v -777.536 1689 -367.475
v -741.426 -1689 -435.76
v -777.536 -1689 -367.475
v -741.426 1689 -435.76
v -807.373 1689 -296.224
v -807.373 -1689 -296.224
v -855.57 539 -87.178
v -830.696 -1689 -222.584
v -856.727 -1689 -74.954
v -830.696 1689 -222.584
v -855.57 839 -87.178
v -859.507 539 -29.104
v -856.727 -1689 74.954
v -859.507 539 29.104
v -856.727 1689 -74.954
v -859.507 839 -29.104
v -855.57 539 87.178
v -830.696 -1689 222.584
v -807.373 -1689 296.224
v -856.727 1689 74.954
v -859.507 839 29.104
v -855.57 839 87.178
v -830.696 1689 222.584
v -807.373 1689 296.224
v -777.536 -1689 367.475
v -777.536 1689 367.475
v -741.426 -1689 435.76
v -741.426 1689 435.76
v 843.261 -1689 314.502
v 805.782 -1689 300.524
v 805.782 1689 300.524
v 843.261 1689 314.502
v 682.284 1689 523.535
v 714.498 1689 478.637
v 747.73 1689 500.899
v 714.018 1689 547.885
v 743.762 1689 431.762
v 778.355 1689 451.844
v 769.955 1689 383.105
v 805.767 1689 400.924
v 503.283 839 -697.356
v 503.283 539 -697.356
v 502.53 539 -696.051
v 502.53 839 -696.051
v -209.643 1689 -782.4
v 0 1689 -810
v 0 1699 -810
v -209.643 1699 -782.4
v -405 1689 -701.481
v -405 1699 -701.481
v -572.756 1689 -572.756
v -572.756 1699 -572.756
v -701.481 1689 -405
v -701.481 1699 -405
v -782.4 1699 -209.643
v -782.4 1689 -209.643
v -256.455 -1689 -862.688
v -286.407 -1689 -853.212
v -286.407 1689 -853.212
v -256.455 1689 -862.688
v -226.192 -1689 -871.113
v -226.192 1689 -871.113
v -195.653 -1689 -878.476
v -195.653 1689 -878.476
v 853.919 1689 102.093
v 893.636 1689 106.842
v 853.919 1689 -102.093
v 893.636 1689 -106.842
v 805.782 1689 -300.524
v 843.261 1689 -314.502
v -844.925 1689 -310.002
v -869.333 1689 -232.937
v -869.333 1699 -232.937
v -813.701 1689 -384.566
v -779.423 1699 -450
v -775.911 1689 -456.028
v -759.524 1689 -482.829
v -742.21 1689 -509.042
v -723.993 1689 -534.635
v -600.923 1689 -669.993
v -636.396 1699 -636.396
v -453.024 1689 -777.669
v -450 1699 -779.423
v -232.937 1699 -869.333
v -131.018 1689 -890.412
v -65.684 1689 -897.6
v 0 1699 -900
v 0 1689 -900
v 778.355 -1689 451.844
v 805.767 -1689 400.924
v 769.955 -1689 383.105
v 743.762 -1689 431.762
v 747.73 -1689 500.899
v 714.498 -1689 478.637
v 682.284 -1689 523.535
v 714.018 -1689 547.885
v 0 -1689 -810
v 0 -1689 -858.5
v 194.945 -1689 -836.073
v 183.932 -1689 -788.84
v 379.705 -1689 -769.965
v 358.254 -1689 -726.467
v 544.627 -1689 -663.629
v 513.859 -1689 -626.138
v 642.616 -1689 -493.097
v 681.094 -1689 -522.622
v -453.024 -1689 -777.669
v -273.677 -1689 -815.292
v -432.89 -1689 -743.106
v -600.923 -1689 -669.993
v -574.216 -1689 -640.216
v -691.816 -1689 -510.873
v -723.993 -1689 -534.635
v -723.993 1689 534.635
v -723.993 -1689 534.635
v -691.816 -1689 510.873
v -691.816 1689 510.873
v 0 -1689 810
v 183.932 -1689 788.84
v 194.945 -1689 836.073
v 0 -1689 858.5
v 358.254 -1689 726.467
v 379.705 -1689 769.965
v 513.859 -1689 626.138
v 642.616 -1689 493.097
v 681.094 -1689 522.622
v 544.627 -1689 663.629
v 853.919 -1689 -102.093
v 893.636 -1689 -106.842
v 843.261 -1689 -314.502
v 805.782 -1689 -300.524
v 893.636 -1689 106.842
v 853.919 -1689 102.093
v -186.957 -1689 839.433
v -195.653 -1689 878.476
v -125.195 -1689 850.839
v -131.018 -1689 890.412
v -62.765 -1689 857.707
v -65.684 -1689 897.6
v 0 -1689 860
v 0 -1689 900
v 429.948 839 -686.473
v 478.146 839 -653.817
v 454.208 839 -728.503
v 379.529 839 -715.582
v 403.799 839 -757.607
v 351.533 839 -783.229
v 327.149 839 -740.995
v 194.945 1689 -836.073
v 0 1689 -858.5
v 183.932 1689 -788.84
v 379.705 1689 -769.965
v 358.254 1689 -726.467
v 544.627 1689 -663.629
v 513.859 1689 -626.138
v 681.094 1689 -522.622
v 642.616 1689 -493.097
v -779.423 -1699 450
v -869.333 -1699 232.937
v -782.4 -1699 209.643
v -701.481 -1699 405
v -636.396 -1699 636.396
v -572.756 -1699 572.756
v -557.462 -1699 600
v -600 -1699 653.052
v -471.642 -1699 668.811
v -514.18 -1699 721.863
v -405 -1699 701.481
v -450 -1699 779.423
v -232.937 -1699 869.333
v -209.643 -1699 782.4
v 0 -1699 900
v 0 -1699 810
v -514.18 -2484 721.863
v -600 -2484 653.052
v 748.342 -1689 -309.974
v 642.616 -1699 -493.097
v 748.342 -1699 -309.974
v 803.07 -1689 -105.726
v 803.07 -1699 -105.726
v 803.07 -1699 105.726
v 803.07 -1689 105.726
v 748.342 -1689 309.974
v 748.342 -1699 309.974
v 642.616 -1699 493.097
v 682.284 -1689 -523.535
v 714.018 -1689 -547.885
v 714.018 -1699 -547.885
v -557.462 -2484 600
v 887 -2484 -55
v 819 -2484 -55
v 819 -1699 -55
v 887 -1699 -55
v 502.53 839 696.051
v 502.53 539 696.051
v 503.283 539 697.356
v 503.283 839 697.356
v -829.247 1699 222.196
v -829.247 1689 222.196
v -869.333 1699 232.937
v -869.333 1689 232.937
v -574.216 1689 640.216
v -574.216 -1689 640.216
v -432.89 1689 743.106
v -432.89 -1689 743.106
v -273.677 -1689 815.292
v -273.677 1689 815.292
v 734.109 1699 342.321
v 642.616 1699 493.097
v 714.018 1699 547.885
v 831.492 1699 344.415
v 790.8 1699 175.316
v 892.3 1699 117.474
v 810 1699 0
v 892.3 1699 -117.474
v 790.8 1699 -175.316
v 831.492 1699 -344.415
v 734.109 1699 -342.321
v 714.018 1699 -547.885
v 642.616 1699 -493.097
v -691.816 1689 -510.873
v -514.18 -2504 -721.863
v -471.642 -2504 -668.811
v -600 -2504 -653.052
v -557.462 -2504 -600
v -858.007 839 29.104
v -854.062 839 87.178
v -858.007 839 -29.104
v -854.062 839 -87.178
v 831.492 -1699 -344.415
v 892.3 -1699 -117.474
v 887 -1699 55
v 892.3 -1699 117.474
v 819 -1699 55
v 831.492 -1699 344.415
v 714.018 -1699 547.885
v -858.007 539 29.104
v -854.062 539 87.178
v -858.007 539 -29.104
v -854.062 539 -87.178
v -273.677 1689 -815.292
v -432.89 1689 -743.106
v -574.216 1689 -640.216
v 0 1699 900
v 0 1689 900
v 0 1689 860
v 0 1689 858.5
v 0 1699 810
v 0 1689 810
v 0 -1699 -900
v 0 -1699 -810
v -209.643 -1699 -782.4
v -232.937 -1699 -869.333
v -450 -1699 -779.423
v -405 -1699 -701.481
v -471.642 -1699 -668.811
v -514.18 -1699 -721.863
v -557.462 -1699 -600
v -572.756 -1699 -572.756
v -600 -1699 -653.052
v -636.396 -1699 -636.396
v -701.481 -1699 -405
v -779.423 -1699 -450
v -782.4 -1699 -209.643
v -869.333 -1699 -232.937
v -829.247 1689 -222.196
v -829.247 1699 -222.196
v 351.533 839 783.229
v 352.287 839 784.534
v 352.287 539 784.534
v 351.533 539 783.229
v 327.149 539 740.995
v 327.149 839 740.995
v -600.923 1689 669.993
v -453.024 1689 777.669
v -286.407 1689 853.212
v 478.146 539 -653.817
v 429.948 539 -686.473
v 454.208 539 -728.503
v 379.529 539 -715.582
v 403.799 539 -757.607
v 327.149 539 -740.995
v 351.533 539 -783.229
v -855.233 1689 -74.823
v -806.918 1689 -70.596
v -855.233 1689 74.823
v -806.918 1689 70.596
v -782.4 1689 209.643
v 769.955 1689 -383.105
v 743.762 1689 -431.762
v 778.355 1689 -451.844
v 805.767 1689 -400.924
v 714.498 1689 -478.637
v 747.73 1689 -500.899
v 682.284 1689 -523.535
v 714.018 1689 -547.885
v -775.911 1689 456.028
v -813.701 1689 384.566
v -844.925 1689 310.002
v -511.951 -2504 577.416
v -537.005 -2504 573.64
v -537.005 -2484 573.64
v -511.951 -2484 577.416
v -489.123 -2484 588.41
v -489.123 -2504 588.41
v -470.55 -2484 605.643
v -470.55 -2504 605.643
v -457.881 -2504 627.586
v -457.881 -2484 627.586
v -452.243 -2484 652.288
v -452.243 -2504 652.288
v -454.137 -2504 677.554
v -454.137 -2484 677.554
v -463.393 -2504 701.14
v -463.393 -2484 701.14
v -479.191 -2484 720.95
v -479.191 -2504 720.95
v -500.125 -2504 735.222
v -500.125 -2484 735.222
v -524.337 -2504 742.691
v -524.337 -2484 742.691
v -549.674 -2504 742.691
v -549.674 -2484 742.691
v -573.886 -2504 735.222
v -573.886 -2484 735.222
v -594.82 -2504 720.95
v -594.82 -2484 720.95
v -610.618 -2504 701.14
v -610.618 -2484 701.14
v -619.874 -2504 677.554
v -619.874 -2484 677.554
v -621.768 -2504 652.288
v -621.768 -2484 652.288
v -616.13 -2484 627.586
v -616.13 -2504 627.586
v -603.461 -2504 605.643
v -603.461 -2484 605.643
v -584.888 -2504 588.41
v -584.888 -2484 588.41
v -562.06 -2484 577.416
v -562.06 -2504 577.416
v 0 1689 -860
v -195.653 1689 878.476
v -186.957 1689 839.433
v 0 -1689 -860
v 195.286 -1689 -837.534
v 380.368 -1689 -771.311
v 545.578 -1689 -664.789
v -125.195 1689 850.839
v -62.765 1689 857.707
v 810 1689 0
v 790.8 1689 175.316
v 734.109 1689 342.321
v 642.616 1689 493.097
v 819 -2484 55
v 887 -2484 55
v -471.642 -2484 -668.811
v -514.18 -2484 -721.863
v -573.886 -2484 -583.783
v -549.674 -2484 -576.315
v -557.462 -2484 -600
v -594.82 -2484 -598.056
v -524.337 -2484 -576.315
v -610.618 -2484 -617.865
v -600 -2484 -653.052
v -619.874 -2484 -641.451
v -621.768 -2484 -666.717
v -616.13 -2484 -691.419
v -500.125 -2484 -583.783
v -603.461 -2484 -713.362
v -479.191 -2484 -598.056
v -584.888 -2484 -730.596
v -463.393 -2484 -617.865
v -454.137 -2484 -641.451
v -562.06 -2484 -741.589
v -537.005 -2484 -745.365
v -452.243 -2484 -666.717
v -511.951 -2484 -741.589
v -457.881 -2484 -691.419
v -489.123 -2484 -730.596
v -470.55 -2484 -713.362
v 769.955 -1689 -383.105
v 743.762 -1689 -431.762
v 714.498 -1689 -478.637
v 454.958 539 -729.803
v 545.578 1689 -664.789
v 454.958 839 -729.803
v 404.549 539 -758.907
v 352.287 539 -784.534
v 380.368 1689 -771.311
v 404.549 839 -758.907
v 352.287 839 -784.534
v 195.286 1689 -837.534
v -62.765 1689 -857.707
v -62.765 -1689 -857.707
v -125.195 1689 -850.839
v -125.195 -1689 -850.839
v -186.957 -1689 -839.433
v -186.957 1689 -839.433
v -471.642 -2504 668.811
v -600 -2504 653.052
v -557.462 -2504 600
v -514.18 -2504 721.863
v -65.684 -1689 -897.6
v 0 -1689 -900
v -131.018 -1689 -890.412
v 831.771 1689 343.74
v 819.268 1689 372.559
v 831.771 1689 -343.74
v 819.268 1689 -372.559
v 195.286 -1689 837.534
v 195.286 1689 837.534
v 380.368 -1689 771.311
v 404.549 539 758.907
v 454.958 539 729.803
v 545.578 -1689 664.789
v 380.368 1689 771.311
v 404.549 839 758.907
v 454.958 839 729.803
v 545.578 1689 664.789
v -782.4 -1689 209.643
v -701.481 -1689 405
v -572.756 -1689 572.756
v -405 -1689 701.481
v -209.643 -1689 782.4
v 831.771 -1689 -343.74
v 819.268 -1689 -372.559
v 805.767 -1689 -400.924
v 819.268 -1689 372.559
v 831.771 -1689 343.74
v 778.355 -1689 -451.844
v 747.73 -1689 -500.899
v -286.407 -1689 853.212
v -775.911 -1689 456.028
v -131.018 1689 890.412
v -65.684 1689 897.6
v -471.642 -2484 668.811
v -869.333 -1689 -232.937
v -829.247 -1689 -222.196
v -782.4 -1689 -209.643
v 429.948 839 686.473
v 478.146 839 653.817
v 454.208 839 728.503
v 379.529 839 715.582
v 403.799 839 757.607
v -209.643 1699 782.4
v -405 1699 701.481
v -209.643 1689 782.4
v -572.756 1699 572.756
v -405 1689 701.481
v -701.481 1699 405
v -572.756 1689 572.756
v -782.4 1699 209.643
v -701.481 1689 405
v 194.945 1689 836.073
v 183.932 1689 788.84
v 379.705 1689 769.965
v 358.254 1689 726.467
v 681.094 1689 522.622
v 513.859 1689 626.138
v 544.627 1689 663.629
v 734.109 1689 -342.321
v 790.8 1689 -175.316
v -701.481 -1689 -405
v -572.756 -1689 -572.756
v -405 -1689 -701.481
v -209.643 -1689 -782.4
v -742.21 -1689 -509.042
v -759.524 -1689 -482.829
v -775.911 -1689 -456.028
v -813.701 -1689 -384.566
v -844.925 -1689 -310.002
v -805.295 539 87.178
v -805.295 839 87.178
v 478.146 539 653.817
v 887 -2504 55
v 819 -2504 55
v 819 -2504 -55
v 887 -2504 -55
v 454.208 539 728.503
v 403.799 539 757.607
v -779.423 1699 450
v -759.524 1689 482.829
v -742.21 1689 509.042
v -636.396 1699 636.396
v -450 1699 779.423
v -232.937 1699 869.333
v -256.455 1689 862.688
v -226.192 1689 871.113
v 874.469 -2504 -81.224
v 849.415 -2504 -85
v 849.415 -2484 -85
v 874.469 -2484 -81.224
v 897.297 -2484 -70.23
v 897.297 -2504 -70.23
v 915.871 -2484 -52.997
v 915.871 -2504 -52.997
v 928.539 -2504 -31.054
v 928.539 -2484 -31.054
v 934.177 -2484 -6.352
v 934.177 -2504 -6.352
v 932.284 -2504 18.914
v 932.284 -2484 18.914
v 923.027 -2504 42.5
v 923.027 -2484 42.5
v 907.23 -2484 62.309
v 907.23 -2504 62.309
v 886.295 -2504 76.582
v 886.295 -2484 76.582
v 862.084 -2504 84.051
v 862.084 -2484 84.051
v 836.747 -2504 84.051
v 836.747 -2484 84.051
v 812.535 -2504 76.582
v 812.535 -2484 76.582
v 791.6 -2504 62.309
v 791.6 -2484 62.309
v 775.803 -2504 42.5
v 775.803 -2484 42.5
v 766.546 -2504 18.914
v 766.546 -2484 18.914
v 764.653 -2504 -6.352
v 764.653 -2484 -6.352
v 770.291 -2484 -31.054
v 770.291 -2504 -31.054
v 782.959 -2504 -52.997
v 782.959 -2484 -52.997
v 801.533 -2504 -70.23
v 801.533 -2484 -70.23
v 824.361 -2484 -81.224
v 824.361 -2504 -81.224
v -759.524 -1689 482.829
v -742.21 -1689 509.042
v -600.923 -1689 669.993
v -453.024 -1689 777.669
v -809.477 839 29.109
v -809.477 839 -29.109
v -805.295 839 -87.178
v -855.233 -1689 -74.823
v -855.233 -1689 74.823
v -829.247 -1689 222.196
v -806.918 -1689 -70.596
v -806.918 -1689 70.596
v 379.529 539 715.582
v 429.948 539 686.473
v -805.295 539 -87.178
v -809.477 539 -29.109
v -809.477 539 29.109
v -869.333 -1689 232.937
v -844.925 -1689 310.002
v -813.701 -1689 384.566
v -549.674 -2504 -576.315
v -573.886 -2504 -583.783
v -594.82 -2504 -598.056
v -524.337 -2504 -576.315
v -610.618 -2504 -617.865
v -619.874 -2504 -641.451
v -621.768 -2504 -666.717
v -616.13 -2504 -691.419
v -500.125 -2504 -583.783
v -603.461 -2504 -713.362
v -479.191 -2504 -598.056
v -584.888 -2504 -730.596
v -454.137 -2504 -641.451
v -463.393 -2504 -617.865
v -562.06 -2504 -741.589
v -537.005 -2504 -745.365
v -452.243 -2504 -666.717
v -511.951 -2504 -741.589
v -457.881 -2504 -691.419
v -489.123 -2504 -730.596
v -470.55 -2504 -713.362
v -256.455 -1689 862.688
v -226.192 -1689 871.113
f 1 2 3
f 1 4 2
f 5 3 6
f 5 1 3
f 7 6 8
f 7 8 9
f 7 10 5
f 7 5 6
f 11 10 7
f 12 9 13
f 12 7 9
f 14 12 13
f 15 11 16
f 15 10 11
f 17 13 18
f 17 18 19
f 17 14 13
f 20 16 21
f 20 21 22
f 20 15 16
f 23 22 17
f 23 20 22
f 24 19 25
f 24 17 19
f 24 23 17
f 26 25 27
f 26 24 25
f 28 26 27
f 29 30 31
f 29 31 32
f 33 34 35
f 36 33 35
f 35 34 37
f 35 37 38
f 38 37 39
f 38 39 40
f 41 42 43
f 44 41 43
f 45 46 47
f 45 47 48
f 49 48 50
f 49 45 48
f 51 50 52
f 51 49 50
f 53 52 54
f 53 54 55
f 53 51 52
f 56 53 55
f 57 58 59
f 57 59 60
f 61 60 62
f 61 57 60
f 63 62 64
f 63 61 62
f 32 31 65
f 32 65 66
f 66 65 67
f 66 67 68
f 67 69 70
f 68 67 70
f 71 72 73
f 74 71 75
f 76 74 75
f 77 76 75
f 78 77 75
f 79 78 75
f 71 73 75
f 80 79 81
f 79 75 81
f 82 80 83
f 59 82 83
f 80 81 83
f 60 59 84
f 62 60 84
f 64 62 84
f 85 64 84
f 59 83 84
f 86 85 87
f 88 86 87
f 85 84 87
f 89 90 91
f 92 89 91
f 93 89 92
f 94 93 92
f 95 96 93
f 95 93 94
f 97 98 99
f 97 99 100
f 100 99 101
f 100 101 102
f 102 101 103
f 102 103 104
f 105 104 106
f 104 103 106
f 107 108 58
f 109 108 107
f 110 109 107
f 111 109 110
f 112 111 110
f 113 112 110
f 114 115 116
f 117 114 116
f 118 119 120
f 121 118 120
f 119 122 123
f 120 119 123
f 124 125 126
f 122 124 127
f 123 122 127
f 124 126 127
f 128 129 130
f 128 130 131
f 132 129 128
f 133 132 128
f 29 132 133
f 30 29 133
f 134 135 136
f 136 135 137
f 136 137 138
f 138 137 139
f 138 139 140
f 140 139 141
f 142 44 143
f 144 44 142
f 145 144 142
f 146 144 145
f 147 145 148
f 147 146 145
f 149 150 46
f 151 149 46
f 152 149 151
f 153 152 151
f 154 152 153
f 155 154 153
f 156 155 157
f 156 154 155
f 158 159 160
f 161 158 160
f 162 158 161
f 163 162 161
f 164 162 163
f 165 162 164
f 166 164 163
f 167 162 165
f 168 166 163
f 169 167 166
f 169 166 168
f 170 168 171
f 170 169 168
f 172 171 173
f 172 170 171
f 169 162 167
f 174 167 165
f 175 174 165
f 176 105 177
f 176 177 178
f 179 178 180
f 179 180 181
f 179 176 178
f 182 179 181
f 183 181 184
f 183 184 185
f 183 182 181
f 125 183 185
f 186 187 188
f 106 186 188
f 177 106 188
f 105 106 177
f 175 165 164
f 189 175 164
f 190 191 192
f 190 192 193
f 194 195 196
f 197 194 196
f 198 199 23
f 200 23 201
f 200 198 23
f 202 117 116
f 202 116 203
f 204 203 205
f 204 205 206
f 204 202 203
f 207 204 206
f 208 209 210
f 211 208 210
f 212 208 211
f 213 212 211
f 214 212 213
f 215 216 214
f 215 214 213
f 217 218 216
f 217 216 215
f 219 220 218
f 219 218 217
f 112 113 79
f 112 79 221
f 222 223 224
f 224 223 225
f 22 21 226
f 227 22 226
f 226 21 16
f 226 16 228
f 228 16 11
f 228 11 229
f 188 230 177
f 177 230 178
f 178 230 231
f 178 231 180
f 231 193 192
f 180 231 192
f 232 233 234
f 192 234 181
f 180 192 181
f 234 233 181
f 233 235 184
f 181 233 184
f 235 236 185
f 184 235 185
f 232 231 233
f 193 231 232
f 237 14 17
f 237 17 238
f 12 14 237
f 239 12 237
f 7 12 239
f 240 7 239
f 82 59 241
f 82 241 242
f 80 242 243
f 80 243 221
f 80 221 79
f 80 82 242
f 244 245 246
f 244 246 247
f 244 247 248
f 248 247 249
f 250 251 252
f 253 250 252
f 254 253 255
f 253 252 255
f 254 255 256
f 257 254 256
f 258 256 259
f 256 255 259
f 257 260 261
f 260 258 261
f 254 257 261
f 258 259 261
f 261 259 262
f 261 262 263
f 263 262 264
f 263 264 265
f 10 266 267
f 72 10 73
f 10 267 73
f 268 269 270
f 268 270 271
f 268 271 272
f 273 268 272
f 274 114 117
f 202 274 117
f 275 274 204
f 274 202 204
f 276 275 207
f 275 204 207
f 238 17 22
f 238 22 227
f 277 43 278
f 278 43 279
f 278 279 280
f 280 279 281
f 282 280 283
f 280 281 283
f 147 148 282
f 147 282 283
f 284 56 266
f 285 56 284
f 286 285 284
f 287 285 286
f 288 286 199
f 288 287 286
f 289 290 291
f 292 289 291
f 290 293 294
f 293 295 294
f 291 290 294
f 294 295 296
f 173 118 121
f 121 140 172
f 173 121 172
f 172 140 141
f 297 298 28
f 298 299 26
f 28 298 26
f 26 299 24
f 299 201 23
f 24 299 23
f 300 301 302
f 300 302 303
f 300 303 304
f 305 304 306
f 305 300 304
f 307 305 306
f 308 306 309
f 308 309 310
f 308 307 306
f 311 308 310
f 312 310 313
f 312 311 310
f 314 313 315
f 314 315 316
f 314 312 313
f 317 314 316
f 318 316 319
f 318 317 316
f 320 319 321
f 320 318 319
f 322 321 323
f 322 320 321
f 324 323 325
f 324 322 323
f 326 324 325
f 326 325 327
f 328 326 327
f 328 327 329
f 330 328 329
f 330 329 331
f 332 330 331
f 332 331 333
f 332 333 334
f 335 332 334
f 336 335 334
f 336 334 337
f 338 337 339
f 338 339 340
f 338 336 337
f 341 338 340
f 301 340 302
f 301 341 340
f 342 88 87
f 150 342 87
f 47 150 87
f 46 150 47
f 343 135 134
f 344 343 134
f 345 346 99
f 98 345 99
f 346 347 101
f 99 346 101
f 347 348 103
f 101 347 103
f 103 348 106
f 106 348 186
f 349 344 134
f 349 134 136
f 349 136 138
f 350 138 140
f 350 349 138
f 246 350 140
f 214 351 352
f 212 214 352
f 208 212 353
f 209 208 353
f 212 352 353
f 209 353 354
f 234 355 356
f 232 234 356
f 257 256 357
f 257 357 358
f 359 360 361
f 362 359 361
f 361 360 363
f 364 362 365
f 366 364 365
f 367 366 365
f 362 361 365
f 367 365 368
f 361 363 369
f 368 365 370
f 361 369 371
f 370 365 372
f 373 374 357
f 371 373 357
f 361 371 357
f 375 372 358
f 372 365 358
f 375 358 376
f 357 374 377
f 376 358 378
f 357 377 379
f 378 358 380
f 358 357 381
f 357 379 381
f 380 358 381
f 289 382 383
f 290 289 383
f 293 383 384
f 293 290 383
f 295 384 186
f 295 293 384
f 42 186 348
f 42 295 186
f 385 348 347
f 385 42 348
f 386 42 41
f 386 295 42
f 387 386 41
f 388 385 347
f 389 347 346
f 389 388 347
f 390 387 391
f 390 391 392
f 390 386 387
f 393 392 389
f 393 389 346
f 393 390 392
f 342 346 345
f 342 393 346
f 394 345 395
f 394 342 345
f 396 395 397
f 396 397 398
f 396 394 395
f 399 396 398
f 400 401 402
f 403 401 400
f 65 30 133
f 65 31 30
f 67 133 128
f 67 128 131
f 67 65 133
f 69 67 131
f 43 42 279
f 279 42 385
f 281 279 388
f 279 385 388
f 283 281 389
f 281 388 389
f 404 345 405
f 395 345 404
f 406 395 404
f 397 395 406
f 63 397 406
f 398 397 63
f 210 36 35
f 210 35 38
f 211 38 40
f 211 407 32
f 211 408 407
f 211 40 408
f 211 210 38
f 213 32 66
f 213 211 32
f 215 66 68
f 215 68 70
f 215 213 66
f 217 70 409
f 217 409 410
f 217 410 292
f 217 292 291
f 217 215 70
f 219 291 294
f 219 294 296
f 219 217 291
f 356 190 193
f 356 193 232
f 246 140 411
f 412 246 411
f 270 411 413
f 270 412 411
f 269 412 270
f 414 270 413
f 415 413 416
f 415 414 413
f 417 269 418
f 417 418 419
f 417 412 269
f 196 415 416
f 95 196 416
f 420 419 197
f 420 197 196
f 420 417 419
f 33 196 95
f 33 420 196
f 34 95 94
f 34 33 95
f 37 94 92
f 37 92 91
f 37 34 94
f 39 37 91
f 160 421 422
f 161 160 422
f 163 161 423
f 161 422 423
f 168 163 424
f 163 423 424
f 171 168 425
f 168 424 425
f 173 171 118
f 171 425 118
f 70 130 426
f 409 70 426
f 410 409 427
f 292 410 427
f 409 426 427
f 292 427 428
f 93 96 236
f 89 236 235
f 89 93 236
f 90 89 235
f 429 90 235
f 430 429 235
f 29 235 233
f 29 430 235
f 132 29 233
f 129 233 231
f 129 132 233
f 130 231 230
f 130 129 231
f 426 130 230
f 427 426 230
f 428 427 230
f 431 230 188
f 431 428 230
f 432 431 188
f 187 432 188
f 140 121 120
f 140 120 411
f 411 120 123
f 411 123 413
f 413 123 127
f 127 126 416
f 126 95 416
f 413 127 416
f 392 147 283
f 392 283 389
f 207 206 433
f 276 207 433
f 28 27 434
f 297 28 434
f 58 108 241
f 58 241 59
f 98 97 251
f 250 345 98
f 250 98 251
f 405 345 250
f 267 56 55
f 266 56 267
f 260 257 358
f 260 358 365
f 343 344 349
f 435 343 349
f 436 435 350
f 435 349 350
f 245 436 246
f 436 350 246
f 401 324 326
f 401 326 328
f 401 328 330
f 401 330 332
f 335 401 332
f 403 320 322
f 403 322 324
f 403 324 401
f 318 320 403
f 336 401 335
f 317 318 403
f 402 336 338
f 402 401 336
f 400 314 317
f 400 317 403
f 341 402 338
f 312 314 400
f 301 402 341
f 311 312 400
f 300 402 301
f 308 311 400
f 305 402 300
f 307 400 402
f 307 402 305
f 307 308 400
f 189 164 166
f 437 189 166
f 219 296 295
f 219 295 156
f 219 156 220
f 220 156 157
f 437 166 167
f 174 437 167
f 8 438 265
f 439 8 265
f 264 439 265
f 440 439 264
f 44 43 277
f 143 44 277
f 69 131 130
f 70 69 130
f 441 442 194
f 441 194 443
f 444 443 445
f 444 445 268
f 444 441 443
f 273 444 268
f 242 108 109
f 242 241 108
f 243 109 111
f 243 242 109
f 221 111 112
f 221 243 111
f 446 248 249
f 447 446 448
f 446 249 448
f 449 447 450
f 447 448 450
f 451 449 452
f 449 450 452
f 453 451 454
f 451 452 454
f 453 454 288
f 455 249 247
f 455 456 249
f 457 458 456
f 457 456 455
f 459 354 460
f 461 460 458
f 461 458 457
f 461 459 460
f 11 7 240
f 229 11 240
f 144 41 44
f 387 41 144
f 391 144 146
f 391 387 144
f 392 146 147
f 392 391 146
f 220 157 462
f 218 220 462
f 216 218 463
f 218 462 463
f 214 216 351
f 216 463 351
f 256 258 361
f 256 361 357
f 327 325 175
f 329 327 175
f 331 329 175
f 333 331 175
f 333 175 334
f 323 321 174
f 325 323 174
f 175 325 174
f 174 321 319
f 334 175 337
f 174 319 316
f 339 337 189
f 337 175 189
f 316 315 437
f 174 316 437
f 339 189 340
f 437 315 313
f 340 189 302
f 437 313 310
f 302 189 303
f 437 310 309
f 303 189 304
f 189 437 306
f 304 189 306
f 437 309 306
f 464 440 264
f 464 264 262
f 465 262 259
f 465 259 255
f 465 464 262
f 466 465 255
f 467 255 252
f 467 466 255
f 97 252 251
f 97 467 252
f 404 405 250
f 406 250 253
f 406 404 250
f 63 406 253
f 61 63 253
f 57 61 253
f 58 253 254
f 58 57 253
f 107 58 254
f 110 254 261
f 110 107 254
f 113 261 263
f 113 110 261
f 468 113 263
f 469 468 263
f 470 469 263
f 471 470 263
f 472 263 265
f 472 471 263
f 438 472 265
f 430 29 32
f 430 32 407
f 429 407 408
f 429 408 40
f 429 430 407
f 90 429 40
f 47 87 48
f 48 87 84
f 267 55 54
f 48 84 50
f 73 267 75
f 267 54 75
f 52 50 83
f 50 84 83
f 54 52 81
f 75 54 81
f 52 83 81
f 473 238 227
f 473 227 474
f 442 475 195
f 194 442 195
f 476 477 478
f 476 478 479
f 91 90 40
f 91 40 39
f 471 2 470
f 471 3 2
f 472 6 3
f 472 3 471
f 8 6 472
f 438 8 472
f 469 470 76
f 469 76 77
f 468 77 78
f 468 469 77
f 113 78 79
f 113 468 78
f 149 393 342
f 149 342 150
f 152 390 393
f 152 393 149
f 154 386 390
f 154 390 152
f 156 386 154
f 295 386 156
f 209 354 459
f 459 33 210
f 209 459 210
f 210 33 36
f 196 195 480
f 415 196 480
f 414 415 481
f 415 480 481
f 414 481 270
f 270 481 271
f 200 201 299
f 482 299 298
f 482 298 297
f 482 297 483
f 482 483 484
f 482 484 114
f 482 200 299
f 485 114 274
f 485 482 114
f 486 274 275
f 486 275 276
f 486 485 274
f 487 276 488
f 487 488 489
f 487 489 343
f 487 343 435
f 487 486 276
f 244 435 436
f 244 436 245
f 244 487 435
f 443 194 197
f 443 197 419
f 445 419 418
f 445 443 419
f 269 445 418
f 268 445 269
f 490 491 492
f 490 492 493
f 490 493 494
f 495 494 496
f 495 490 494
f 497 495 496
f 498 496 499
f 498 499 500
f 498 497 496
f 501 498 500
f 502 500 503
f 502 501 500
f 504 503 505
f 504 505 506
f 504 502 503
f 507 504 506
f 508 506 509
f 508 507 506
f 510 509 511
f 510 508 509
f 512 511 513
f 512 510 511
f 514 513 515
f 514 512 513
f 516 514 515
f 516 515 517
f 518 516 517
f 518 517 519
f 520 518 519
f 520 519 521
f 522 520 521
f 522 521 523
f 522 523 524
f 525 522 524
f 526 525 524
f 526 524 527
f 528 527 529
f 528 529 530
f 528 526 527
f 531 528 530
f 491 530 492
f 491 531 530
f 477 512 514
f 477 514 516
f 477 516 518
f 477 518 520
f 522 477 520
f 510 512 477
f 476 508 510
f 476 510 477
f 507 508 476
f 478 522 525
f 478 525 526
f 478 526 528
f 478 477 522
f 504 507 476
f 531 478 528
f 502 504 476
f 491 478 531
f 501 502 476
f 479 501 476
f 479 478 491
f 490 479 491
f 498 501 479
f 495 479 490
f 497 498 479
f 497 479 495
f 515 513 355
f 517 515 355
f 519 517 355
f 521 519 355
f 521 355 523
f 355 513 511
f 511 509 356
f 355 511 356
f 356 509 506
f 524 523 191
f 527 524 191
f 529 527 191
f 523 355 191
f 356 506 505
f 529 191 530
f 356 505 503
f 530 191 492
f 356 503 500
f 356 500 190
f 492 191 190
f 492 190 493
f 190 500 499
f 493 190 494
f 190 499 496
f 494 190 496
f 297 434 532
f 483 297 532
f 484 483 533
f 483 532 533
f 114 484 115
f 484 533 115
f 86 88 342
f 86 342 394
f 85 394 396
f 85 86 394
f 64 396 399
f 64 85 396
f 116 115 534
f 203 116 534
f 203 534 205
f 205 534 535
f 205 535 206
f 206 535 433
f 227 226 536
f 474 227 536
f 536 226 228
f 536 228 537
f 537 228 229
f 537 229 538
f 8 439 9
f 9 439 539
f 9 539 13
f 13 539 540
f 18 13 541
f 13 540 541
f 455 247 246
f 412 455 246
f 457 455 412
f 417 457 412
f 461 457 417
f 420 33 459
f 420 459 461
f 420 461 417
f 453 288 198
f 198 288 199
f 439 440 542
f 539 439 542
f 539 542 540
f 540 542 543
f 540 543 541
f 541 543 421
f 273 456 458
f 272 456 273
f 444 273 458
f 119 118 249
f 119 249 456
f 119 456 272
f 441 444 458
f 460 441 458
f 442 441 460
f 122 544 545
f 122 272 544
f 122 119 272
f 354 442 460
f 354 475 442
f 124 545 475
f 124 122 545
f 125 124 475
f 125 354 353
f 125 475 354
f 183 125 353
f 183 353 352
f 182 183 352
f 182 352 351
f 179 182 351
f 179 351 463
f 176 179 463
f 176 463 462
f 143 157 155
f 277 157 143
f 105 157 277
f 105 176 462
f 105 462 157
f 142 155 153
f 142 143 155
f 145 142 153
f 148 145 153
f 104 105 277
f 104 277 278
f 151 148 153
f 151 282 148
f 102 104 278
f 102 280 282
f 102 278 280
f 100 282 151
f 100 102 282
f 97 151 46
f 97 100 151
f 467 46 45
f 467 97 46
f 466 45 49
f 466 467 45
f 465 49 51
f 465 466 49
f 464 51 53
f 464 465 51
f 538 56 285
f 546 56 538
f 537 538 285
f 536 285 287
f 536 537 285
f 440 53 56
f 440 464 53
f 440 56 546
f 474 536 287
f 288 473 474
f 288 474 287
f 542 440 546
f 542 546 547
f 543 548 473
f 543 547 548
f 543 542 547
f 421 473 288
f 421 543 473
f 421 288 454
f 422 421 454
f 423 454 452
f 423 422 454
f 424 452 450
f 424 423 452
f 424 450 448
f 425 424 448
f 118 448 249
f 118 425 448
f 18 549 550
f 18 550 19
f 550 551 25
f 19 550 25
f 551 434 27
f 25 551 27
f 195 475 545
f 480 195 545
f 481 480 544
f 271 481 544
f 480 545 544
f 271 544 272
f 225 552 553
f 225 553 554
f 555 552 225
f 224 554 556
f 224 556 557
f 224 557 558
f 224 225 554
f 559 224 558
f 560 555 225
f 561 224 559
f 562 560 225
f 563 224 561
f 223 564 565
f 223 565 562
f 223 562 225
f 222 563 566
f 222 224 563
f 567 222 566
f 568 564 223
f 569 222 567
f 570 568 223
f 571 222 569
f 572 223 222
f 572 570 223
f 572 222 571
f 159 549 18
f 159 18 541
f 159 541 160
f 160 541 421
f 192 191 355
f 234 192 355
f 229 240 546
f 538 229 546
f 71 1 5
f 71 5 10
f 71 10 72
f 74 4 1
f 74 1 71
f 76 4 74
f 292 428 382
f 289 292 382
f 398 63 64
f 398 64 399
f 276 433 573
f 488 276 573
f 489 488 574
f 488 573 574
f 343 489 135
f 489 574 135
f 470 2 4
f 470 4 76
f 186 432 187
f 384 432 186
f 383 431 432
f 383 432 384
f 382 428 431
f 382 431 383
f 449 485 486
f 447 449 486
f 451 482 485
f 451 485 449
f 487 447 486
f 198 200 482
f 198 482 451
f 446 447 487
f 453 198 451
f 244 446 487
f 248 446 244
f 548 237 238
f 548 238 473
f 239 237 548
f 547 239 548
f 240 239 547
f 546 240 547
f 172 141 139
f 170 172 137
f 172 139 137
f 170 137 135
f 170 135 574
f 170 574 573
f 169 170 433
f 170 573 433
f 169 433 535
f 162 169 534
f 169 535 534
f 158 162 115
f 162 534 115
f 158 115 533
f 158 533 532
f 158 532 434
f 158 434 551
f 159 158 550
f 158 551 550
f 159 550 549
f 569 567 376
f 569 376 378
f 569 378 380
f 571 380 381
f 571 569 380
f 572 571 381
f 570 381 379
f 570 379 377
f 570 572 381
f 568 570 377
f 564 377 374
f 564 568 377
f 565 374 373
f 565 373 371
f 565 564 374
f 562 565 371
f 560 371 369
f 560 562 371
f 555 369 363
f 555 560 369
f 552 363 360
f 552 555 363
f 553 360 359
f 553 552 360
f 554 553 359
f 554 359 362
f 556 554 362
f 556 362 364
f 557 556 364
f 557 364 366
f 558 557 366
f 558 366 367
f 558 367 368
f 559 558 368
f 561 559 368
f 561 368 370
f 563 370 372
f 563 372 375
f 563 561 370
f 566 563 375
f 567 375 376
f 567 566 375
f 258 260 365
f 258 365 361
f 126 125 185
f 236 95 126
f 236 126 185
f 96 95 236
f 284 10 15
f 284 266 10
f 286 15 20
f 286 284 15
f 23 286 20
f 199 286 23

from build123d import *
from build123d.topology import SkipClean

# Parameters (mm, degrees)
IZIM1_R                       = 860
IZIM1_R_2                     = 858.5
Y_KSEKLIK_EKSTR_ZYON1_DEPTH   = 1689
IZIM2_R                       = 858.5
IZIM2_R_2                     = 810
Y_KSEKLIK_EKSTR_ZYON2_DEPTH   = 1689
IZIM3_W                       = 90.627186628
IZIM3_H                       = 174.356131312
KES_EKSTR_ZYON3_DEPTH         = 150
Y_KSEKLIK_EKSTR_ZYON3_DEPTH   = 10
Y_KSEKLIK_EKSTR_ZYON4_DEPTH   = 10
Y_KSEKLIK_EKSTR_ZYON4_2_DEPTH = 10
Y_KSEKLIK_EKSTR_ZYON6_DEPTH   = 10
Y_KSEKLIK_EKSTR_ZYON7_DEPTH   = 10
Y_KSEKLIK_EKSTR_ZYON7_2_DEPTH = 10
Y_KSEKLIK_EKSTR_ZYON7_3_DEPTH = 10
Y_KSEKLIK_EKSTR_ZYON8_DEPTH   = 3378
IZIM9_W                       = 68
IZIM9_H                       = 110
Y_KSEKLIK_EKSTR_ZYON9_DEPTH   = 805
IZIM10_R                      = 85
Y_KSEKLIK_EKSTR_ZYON10_DEPTH  = 20


with BuildPart() as part:
    # Çizim1 → Yükseklik-Ekstrüzyon1 (new, symmetric)
    with BuildSketch(Plane(origin=(0, 0, 0), x_dir=(1, 0, 0), z_dir=(0, 1, 0))):
        with Locations(Location((0, 0, 0), (0, 0, 270))):
            Circle(IZIM1_R)
        with Locations(Location((0, 0, 0), (0, 0, 270))):
            Circle(IZIM1_R_2, mode=Mode.SUBTRACT)
    extrude(amount=Y_KSEKLIK_EKSTR_ZYON1_DEPTH, both=True)


with BuildPart() as body_2:
    # Çizim2 → Yükseklik-Ekstrüzyon2 (new, symmetric)
    with BuildSketch(Plane(origin=(0, 0, 0), x_dir=(1, 0, 0), z_dir=(0, 1, 0))):
        with Locations(Location((0, 0, 0), (0, 0, 270))):
            Circle(IZIM2_R)
        with Locations(Location((0, 0, 0), (0, 0, 270))):
            Circle(IZIM2_R_2, mode=Mode.SUBTRACT)
    extrude(amount=Y_KSEKLIK_EKSTR_ZYON2_DEPTH, both=True)


with BuildPart() as kes_ekstr_zyon3_tool:
    # Çizim3 → Kes-Ekstrüzyon3 (new, symmetric)
    with BuildSketch(Plane(origin=(0, 689, 0), x_dir=(1, 0, 0), z_dir=(0, 1, 0))):
        Polygon((370.851260958, 816.689357342), (521.848099979, 729.511291685), (476.534506666, 651.025845793), (325.537667644, 738.203911449), align=None)
        with Locations((-847.385767623, 0)):
            Rectangle(IZIM3_W, IZIM3_H)
        Polygon((521.848099979, -729.511291686), (370.851260958, -816.689357342), (325.537667644, -738.203911449), (476.534506666, -651.025845793), align=None)
    extrude(amount=KES_EKSTR_ZYON3_DEPTH, both=True)


with BuildPart() as part_1:
    add(part.part)

    # Kes-Ekstrüzyon3: cut by kes_ekstr_zyon3_tool
    add(kes_ekstr_zyon3_tool.part, mode=Mode.SUBTRACT)



with BuildPart() as body_2_1:
    add(body_2.part)

    # Kes-Ekstrüzyon3: cut by kes_ekstr_zyon3_tool
    add(kes_ekstr_zyon3_tool.part, mode=Mode.SUBTRACT)


with BuildPart() as body_3:
    # Çizim4 → Yükseklik-Ekstrüzyon3 (new body)
    with BuildSketch(Plane(origin=(0, 1689, 0), x_dir=(1, 0, 0), z_dir=(0, 1, 0))):
        with BuildLine():
            Line((-782.399919294, 209.643426533), (-829.247321869, 222.196150221))
            ThreePointArc((-829.247321869, 222.196150221), (-522.621686804, 681.09384264), (0, 858.5))
            Line((0, 858.5), (0, 810))
            ThreePointArc((0, 810), (-493.096757497, 642.616205636), (-782.399919294, 209.643426533))
        make_face()
    extrude(amount=Y_KSEKLIK_EKSTR_ZYON3_DEPTH)



with BuildPart() as body_4:
    # Çizim4<3> → Yükseklik-Ekstrüzyon4 (new body)
    with BuildSketch(Plane(origin=(0, 1689, 0), x_dir=(1, 0, 0), z_dir=(0, 1, 0))):
        with BuildLine():
            ThreePointArc((810, 0), (767.013404891, -260.365966896), (642.616205636, -493.096757497))
            Line((642.616205636, -493.096757497), (681.09384264, -522.621686804))
            ThreePointArc((681.09384264, -522.621686804), (812.939516172, -275.955780963), (858.5, 0))
            ThreePointArc((858.5, 0), (812.939516172, 275.955780963), (681.09384264, 522.621686804))
            Line((681.09384264, 522.621686804), (642.616205636, 493.096757497))
            ThreePointArc((642.616205636, 493.096757497), (767.013404891, 260.365966896), (810, 0))
        make_face()
    extrude(amount=Y_KSEKLIK_EKSTR_ZYON4_DEPTH)


with BuildPart() as body_5:
    # Çizim4<3> → Y_kseklik-Ekstr_zyon4 2 (new body)
    with BuildSketch(Plane(origin=(0, 1689, 0), x_dir=(1, 0, 0), z_dir=(0, 1, 0))):
        with BuildLine():
            Line((0, -858.5), (0, -810))
            ThreePointArc((0, -810), (-493.096757497, -642.616205636), (-782.399919294, -209.643426533))
            Line((-782.399919294, -209.643426533), (-829.247321869, -222.196150221))
            ThreePointArc((-829.247321869, -222.196150221), (-522.621686804, -681.09384264), (0, -858.5))
        make_face()
    extrude(amount=Y_KSEKLIK_EKSTR_ZYON4_2_DEPTH)


with BuildPart() as body_3_1:
    add(body_3.part)

    add(body_5.part)  # Yükseklik-Ekstrüzyon6 merges body 5

    add(body_4.part)  # Yükseklik-Ekstrüzyon6 merges body 4
    # Çizim6 → Yükseklik-Ekstrüzyon6 (add)
    with BuildSketch(Plane(origin=(0, 1699, 0), x_dir=(1, 0, 0), z_dir=(0, 1, 0))):
        with BuildLine():
            Line((-782.399919294, -209.643426533), (-869.33324366, -232.937140592))
            ThreePointArc((-869.33324366, -232.937140592), (-547.885286108, -714.018006262), (0, -900))
            Line((0, -900), (0, -810))
            ThreePointArc((0, -810), (-493.096757497, -642.616205636), (-782.399919294, -209.643426533))
        make_face()
        with BuildLine():
            Line((642.616205636, -493.096757497), (714.018006262, -547.885286108))
            ThreePointArc((714.018006262, -547.885286108), (900, 0), (714.018006262, 547.885286108))
            Line((714.018006262, 547.885286108), (642.616205636, 493.096757497))
            ThreePointArc((642.616205636, 493.096757497), (810, 0), (642.616205636, -493.096757497))
        make_face()
        with BuildLine():
            Line((-782.399919294, 209.643426533), (-869.33324366, 232.937140592))
            ThreePointArc((-869.33324366, 232.937140592), (-547.885286108, 714.018006262), (0, 900))
            Line((0, 900), (0, 810))
            ThreePointArc((0, 810), (-493.096757497, 642.616205636), (-782.399919294, 209.643426533))
        make_face()
    extrude(amount=-Y_KSEKLIK_EKSTR_ZYON6_DEPTH)


with BuildPart() as body_4_2:
    # Çizim7 → Yükseklik-Ekstrüzyon7 (new body)
    with BuildSketch(Plane.XZ.offset(1689)):
        with BuildLine():
            Line((-869.33324366, -232.937140592), (-782.399919294, -209.643426533))
            ThreePointArc((-782.399919294, -209.643426533), (-493.096757497, -642.616205636), (0, -810))
            Line((0, -810), (0, -900))
            ThreePointArc((0, -900), (-547.885286108, -714.018006262), (-869.33324366, -232.937140592))
        make_face()
    extrude(amount=Y_KSEKLIK_EKSTR_ZYON7_DEPTH)


with BuildPart() as body_5_2:
    # Çizim7 → Y_kseklik-Ekstr_zyon7 2 (new body)
    with BuildSketch(Plane.XZ.offset(1689)):
        with BuildLine():
            Line((-869.33324366, 232.937140592), (-782.399919294, 209.643426533))
            ThreePointArc((-782.399919294, 209.643426533), (-493.096757497, 642.616205636), (0, 810))
            Line((0, 810), (0, 900))
            ThreePointArc((0, 900), (-547.885286108, 714.018006262), (-869.33324366, 232.937140592))
        make_face()
    extrude(amount=Y_KSEKLIK_EKSTR_ZYON7_2_DEPTH)


with BuildPart() as body_6:
    # Çizim7 → Y_kseklik-Ekstr_zyon7 3 (new body)
    with BuildSketch(Plane.XZ.offset(1689)):
        with BuildLine():
            Line((714.018006262, -547.885286108), (642.616205636, -493.096757497))
            ThreePointArc((642.616205636, -493.096757497), (810, 0), (642.616205636, 493.096757497))
            Line((642.616205636, 493.096757497), (714.018006262, 547.885286108))
            ThreePointArc((714.018006262, 547.885286108), (900, 0), (714.018006262, -547.885286108))
        make_face()
    extrude(amount=Y_KSEKLIK_EKSTR_ZYON7_3_DEPTH)


with BuildPart() as part_2:
    with SkipClean():  # the faces are left unmerged after this step: merging them gives an invalid solid
        add(part_1.part)

        add(body_2_1.part)  # Yükseklik-Ekstrüzyon8 merges body 2

        add(body_3_1.part)  # Yükseklik-Ekstrüzyon8 merges body 3

        add(body_4_2.part)  # Yükseklik-Ekstrüzyon8 merges body 4 2

        add(body_5_2.part)  # Yükseklik-Ekstrüzyon8 merges body 5 2

        add(body_6.part)  # Yükseklik-Ekstrüzyon8 merges body 6
        # Çizim8 → Yükseklik-Ekstrüzyon8 (add)
        with BuildSketch(Plane(origin=(0, -1689, 0), x_dir=(1, 0, 0), z_dir=(0, 1, 0))):
            with BuildLine():
                Line((-740.133265027, 435), (-775.911401892, 456.027955737))
                ThreePointArc((-775.911401892, 456.027955737), (-750.981383146, 496.01105045), (-723.992976628, 534.634613352))
                Line((-723.992976628, 534.634613352), (-690.608856039, 509.982017292))
                ThreePointArc((-690.608856039, 509.982017292), (-716.352797145, 473.139429791), (-740.133265027, 435))
            make_face()
            with BuildLine():
                Line((-273.199988147, 813.869778574), (-286.406510579, 853.212347952))
                ThreePointArc((-286.406510579, 853.212347952), (-241.360316302, 867.032408688), (-195.652570174, 878.475993858))
                Line((-195.652570174, 878.475993858), (-186.630812772, 837.968489696))
                ThreePointArc((-186.630812772, 837.968489696), (-230.230923939, 827.052580954), (-273.199988147, 813.869778574))
            make_face()
            with BuildLine():
                Line((-273.199988147, -813.869778574), (-286.406510579, -853.212347952))
                ThreePointArc((-286.406510579, -853.212347952), (-241.360316302, -867.032408688), (-195.652570174, -878.475993858))
                Line((-195.652570174, -878.475993858), (-186.630812772, -837.968489696))
                ThreePointArc((-186.630812772, -837.968489696), (-230.230923939, -827.052580954), (-273.199988147, -813.869778574))
            make_face()
            with BuildLine():
                Line((-740.133265027, -435), (-775.911401892, -456.027955737))
                ThreePointArc((-775.911401892, -456.027955737), (-750.981383146, -496.01105045), (-723.992976628, -534.634613352))
                Line((-723.992976628, -534.634613352), (-690.608856039, -509.982017292))
                ThreePointArc((-690.608856039, -509.982017292), (-716.352797145, -473.139429791), (-740.133265027, -435))
            make_face()
            with BuildLine():
                Line((805.76673212, -400.923899772), (768.611932806, -382.436853283))
                ThreePointArc((768.611932806, -382.436853283), (787.573775284, -341.686696384), (804.376932787, -300))
                Line((804.376932787, -300), (843.260616783, -314.502038439))
                ThreePointArc((843.260616783, -314.502038439), (825.645192493, -358.203875067), (805.76673212, -400.923899772))
            make_face()
            with BuildLine():
                Line((805.76673212, 400.923899772), (768.611932806, 382.436853283))
                ThreePointArc((768.611932806, 382.436853283), (787.573775284, 341.686696384), (804.376932787, 300))
                Line((804.376932787, 300), (843.260616783, 314.502038439))
                ThreePointArc((843.260616783, 314.502038439), (825.645192493, 358.203875067), (805.76673212, 400.923899772))
            make_face()
        extrude(amount=Y_KSEKLIK_EKSTR_ZYON8_DEPTH)

    # Çizim9 → Yükseklik-Ekstrüzyon9 (add)
    with SkipClean():  # the faces are left unmerged after this step: merging them gives an invalid solid
        with BuildSketch(Plane.XZ.offset(1699)):
            Polygon((-514.179912363, -721.86311871), (-600, -653.052417812), (-557.462475809, -600), (-471.642388172, -668.810700898), align=None)
            Polygon((-557.462475809, 600), (-471.642388172, 668.810700898), (-514.179912363, 721.86311871), (-600, 653.052417812), align=None)
            with Locations((853, 0)):
                Rectangle(IZIM9_W, IZIM9_H)
        extrude(amount=Y_KSEKLIK_EKSTR_ZYON9_DEPTH)

    # Çizim10 → Yükseklik-Ekstrüzyon10 (add)
    with SkipClean():  # the faces are left unmerged after this step: merging them gives an invalid solid
        with BuildSketch(Plane.XZ.offset(2504)):
            with Locations(Location((849.415102064, 0, 0), (0, 0, 270))):
                Circle(IZIM10_R)
            with Locations(Location((-537.005415531, -660.36532662, 0), (0, 0, 270))):
                Circle(IZIM10_R)
            with Locations(Location((-537.005415531, 658.640095908, 0), (0, 0, 270))):
                Circle(IZIM10_R)
        extrude(amount=-Y_KSEKLIK_EKSTR_ZYON10_DEPTH)


solid = part_2.part
